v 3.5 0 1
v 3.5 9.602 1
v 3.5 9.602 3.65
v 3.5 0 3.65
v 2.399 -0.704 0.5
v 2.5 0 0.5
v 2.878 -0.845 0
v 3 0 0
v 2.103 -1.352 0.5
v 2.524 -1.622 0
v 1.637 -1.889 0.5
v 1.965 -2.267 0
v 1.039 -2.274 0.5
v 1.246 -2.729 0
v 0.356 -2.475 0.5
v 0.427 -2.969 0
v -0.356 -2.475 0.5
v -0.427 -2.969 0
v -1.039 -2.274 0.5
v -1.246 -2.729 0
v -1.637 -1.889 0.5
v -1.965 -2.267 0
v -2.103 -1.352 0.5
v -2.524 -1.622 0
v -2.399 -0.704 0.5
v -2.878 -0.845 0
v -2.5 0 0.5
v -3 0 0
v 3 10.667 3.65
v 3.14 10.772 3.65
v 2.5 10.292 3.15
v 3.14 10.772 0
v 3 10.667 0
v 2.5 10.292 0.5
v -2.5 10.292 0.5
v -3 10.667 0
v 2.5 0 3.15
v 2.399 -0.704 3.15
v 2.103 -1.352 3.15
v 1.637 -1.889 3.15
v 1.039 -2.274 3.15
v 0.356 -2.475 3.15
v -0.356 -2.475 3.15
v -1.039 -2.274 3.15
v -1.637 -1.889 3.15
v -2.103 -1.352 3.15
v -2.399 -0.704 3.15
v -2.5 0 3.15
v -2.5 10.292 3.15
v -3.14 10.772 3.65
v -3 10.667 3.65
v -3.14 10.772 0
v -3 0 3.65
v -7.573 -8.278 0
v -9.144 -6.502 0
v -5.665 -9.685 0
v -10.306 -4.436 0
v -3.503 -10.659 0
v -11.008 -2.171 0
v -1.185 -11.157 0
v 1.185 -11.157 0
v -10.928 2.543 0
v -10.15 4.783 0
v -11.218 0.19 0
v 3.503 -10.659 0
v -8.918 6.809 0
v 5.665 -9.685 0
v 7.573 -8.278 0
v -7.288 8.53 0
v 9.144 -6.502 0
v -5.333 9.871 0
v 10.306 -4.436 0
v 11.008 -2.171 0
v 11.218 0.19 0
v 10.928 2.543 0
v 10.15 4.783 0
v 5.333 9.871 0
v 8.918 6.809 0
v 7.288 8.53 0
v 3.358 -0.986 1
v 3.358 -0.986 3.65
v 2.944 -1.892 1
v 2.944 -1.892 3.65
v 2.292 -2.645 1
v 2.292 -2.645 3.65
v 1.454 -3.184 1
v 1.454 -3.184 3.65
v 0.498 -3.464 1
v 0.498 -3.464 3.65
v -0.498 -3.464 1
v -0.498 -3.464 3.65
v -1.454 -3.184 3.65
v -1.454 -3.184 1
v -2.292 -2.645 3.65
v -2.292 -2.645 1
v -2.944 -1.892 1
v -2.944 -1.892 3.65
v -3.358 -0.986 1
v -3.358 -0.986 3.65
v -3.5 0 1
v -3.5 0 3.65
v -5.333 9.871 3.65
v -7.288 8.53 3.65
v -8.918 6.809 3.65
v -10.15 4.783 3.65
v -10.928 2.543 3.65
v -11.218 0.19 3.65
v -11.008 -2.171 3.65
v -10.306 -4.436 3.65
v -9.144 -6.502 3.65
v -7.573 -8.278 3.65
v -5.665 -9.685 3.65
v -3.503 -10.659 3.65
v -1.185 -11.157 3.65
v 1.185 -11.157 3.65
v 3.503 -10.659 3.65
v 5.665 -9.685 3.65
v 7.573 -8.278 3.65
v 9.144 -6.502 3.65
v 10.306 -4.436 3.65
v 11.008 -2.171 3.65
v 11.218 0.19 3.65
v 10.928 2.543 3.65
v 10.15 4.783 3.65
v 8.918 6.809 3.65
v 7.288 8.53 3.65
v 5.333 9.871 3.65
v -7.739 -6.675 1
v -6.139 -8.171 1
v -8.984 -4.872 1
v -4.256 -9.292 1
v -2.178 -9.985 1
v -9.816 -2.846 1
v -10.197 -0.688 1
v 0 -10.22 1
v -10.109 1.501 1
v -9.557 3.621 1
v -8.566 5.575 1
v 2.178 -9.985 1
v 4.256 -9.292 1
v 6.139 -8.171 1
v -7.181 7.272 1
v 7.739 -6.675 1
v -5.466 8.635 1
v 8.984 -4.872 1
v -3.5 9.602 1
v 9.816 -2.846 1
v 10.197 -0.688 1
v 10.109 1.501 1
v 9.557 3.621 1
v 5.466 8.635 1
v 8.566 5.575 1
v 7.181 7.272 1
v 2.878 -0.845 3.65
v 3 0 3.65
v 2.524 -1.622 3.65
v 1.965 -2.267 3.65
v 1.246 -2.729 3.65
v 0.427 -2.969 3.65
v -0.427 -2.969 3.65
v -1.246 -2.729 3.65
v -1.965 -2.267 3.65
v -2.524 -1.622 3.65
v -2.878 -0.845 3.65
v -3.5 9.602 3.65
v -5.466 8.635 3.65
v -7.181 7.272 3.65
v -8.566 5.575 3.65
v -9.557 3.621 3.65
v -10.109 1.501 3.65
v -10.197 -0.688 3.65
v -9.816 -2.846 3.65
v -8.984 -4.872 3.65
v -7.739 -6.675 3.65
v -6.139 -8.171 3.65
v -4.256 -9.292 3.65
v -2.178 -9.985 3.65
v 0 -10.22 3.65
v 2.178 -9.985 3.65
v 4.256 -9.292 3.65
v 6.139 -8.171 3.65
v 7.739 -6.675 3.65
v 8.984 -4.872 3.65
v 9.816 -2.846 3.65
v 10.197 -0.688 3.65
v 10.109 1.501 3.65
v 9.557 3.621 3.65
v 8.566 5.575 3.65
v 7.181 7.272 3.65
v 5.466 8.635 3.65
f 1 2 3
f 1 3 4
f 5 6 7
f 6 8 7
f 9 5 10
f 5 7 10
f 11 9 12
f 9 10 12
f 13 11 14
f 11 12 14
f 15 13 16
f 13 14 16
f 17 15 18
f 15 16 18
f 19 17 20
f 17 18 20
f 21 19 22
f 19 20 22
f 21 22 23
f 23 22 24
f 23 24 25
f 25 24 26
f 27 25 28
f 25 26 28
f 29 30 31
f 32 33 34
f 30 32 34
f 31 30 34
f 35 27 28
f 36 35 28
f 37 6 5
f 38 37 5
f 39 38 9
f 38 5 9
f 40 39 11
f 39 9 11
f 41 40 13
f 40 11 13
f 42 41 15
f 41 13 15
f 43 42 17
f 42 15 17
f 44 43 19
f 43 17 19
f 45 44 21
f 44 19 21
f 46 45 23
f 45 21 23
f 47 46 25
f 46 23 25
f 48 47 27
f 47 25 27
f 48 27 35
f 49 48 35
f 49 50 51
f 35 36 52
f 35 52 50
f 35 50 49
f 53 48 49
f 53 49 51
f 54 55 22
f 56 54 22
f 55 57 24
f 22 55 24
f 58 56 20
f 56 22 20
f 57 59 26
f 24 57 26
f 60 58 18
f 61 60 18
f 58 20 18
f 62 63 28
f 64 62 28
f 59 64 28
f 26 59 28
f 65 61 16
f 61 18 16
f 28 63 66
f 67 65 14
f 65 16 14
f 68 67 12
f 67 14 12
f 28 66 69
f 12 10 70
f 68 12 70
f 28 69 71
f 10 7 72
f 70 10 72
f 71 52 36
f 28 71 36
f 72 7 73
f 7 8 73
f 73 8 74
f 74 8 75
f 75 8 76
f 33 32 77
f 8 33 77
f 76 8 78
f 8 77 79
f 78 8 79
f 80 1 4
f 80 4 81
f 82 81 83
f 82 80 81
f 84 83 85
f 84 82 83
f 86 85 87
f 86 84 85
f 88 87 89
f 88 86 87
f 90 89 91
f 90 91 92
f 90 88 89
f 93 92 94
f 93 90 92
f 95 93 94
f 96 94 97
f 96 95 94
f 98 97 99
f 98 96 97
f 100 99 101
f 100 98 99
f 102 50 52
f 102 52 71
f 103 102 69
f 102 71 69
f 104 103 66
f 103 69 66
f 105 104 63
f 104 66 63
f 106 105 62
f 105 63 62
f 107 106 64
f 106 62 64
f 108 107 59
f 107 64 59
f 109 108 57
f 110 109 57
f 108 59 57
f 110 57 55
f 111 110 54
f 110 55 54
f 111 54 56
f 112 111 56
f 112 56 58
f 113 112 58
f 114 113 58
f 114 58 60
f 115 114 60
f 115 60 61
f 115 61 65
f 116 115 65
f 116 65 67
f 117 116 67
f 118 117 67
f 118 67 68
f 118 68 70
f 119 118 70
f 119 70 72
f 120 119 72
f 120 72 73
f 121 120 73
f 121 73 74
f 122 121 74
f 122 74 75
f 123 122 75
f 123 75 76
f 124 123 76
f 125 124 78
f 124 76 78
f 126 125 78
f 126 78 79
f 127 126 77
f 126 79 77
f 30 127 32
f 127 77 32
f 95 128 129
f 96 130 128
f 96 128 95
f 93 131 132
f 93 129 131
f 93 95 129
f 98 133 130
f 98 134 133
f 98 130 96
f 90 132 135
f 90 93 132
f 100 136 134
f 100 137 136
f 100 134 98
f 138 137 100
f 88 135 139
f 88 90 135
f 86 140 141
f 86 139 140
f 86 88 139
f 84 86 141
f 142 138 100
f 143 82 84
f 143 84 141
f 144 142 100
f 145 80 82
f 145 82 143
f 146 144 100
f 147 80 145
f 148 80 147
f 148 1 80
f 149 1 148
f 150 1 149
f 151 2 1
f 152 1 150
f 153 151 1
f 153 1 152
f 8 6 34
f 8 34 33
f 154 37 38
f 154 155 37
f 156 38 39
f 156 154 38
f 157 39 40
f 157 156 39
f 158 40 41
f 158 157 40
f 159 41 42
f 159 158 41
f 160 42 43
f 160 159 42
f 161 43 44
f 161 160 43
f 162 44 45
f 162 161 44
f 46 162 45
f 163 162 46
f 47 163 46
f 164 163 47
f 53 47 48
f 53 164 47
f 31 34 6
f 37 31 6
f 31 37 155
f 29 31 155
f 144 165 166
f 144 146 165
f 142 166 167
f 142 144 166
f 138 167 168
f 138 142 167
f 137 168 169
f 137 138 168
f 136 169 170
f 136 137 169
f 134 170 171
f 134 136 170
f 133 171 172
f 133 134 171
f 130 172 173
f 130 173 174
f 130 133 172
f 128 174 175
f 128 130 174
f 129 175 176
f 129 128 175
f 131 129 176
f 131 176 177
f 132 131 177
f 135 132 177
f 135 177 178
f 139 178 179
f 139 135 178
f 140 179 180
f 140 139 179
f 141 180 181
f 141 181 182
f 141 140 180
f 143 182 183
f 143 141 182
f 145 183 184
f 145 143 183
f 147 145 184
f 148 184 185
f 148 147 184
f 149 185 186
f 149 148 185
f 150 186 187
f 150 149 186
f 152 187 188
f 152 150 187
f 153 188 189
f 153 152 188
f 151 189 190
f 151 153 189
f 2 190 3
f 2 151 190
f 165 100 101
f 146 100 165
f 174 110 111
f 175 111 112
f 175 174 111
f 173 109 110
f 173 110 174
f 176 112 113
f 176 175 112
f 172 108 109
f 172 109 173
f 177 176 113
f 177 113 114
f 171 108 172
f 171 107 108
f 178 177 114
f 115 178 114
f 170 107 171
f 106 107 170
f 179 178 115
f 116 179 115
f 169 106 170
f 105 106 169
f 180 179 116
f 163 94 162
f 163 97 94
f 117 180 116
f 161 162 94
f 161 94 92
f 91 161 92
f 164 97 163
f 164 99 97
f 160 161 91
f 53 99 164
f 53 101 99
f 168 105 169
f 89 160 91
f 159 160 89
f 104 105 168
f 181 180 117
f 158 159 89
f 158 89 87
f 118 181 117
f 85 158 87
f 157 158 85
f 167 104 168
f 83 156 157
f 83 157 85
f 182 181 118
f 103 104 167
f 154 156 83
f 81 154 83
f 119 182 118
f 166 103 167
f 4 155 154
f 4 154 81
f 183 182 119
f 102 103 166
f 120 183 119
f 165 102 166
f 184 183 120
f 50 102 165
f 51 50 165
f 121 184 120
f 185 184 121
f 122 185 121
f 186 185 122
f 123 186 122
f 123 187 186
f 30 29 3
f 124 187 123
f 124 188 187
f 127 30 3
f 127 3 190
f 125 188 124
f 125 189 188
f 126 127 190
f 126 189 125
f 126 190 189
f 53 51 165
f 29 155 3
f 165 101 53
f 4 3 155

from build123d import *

# Parameters (mm, degrees)
F1_DEPTH    = 3.65
F2_T        = -1
F3_T1_DEPTH = 7.0190808226
F3_T3_DEPTH = 12.2237754854
F3_T6_ANGLE = 180
F3_T8_ANGLE = 180


# Not quite as in the source:
# - a fillet or chamfer that OpenCascade refuses, or shapes differently, is made with other operations: its cross-section is extruded or revolved along the edge and cut away or added


with BuildPart() as f1:
    # F0 (on Top) → F1 (new body)
    with BuildSketch(Plane.XY):
        with BuildLine():
            ThreePointArc((-2.5, 10.9379339914), (-6.9942261902, -8.773209219), (11.22, 0))
            ThreePointArc((11.22, 0), (8.773209219, 6.9942261902), (2.5, 10.9379339914))
            Line((2.5, 10.9379339914), (2.5, 0))
            ThreePointArc((2.5, 0), (0, -2.5), (-2.5, 0))
            Line((-2.5, 0), (-2.5, 10.9379339914))
        make_face()
    extrude(amount=F1_DEPTH)

    # F2
    f2_openings = [f1.faces().sort_by_distance(p)[0] for p in [
        (-6.797639, -8.52662, 3.65),
    ]]
    offset(amount=F2_T, openings=f2_openings)

    # F3: chamfer of 0.5 on 8 edges, made by hand

    # F3_s2 → F3_t1 (cut)
    with BuildSketch(Plane.XY.offset(-1.6845404113)):
        with BuildLine():
            Line((-3.1399253731, 10.7716882916), (-2.5, 10.2916665317))
            Line((-2.5, 10.2916665317), (-2.5, 10.9379339914))
            ThreePointArc((-2.5, 10.9379339914), (-2.8272189257, 10.857957135), (-3.1399253731, 10.7716882916))
        make_face()
        with BuildLine():
            Line((3.1399253731, 10.7716882916), (2.5, 10.2916665317))
            Line((2.5, 10.2916665317), (2.5, 10.9379339914))
            ThreePointArc((2.5, 10.9379339914), (2.8272189257, 10.857957135), (3.1399253731, 10.7716882916))
        make_face()
    extrude(amount=F3_T1_DEPTH, mode=Mode.SUBTRACT)

    # F3_s4 → F3_t3 (cut)
    with BuildSketch(Plane.XZ.offset(-12.2237754854)):
        Polygon((2.5, 0.5), (3, 0), (2.5, 0), align=None)
        Polygon((2.5, 3.15), (3, 3.65), (2.5, 3.65), align=None)
        Polygon((-2.5, 0.5), (-3, 0), (-2.5, 0), align=None)
        Polygon((-2.5, 3.15), (-3, 3.65), (-2.5, 3.65), align=None)
    extrude(amount=F3_T3_DEPTH, mode=Mode.SUBTRACT)

    # F3_s5 → F3_t6 (revolve, cut)
    with BuildSketch(Plane.XZ):
        Polygon((2.5, 3.15), (3, 3.65), (2.5, 3.65), align=None)
    revolve(axis=Axis((0, 0, 3.65), (0, 0, -1)), revolution_arc=F3_T6_ANGLE, mode=Mode.SUBTRACT)

    # F3_s7 → F3_t8 (revolve, cut)
    with BuildSketch(Plane.XZ):
        Polygon((2.5, 0.5), (3, 0), (2.5, 0), align=None)
    revolve(axis=Axis((0, 0, 0), (0, 0, -1)), revolution_arc=F3_T8_ANGLE, mode=Mode.SUBTRACT)


solid = f1.part
